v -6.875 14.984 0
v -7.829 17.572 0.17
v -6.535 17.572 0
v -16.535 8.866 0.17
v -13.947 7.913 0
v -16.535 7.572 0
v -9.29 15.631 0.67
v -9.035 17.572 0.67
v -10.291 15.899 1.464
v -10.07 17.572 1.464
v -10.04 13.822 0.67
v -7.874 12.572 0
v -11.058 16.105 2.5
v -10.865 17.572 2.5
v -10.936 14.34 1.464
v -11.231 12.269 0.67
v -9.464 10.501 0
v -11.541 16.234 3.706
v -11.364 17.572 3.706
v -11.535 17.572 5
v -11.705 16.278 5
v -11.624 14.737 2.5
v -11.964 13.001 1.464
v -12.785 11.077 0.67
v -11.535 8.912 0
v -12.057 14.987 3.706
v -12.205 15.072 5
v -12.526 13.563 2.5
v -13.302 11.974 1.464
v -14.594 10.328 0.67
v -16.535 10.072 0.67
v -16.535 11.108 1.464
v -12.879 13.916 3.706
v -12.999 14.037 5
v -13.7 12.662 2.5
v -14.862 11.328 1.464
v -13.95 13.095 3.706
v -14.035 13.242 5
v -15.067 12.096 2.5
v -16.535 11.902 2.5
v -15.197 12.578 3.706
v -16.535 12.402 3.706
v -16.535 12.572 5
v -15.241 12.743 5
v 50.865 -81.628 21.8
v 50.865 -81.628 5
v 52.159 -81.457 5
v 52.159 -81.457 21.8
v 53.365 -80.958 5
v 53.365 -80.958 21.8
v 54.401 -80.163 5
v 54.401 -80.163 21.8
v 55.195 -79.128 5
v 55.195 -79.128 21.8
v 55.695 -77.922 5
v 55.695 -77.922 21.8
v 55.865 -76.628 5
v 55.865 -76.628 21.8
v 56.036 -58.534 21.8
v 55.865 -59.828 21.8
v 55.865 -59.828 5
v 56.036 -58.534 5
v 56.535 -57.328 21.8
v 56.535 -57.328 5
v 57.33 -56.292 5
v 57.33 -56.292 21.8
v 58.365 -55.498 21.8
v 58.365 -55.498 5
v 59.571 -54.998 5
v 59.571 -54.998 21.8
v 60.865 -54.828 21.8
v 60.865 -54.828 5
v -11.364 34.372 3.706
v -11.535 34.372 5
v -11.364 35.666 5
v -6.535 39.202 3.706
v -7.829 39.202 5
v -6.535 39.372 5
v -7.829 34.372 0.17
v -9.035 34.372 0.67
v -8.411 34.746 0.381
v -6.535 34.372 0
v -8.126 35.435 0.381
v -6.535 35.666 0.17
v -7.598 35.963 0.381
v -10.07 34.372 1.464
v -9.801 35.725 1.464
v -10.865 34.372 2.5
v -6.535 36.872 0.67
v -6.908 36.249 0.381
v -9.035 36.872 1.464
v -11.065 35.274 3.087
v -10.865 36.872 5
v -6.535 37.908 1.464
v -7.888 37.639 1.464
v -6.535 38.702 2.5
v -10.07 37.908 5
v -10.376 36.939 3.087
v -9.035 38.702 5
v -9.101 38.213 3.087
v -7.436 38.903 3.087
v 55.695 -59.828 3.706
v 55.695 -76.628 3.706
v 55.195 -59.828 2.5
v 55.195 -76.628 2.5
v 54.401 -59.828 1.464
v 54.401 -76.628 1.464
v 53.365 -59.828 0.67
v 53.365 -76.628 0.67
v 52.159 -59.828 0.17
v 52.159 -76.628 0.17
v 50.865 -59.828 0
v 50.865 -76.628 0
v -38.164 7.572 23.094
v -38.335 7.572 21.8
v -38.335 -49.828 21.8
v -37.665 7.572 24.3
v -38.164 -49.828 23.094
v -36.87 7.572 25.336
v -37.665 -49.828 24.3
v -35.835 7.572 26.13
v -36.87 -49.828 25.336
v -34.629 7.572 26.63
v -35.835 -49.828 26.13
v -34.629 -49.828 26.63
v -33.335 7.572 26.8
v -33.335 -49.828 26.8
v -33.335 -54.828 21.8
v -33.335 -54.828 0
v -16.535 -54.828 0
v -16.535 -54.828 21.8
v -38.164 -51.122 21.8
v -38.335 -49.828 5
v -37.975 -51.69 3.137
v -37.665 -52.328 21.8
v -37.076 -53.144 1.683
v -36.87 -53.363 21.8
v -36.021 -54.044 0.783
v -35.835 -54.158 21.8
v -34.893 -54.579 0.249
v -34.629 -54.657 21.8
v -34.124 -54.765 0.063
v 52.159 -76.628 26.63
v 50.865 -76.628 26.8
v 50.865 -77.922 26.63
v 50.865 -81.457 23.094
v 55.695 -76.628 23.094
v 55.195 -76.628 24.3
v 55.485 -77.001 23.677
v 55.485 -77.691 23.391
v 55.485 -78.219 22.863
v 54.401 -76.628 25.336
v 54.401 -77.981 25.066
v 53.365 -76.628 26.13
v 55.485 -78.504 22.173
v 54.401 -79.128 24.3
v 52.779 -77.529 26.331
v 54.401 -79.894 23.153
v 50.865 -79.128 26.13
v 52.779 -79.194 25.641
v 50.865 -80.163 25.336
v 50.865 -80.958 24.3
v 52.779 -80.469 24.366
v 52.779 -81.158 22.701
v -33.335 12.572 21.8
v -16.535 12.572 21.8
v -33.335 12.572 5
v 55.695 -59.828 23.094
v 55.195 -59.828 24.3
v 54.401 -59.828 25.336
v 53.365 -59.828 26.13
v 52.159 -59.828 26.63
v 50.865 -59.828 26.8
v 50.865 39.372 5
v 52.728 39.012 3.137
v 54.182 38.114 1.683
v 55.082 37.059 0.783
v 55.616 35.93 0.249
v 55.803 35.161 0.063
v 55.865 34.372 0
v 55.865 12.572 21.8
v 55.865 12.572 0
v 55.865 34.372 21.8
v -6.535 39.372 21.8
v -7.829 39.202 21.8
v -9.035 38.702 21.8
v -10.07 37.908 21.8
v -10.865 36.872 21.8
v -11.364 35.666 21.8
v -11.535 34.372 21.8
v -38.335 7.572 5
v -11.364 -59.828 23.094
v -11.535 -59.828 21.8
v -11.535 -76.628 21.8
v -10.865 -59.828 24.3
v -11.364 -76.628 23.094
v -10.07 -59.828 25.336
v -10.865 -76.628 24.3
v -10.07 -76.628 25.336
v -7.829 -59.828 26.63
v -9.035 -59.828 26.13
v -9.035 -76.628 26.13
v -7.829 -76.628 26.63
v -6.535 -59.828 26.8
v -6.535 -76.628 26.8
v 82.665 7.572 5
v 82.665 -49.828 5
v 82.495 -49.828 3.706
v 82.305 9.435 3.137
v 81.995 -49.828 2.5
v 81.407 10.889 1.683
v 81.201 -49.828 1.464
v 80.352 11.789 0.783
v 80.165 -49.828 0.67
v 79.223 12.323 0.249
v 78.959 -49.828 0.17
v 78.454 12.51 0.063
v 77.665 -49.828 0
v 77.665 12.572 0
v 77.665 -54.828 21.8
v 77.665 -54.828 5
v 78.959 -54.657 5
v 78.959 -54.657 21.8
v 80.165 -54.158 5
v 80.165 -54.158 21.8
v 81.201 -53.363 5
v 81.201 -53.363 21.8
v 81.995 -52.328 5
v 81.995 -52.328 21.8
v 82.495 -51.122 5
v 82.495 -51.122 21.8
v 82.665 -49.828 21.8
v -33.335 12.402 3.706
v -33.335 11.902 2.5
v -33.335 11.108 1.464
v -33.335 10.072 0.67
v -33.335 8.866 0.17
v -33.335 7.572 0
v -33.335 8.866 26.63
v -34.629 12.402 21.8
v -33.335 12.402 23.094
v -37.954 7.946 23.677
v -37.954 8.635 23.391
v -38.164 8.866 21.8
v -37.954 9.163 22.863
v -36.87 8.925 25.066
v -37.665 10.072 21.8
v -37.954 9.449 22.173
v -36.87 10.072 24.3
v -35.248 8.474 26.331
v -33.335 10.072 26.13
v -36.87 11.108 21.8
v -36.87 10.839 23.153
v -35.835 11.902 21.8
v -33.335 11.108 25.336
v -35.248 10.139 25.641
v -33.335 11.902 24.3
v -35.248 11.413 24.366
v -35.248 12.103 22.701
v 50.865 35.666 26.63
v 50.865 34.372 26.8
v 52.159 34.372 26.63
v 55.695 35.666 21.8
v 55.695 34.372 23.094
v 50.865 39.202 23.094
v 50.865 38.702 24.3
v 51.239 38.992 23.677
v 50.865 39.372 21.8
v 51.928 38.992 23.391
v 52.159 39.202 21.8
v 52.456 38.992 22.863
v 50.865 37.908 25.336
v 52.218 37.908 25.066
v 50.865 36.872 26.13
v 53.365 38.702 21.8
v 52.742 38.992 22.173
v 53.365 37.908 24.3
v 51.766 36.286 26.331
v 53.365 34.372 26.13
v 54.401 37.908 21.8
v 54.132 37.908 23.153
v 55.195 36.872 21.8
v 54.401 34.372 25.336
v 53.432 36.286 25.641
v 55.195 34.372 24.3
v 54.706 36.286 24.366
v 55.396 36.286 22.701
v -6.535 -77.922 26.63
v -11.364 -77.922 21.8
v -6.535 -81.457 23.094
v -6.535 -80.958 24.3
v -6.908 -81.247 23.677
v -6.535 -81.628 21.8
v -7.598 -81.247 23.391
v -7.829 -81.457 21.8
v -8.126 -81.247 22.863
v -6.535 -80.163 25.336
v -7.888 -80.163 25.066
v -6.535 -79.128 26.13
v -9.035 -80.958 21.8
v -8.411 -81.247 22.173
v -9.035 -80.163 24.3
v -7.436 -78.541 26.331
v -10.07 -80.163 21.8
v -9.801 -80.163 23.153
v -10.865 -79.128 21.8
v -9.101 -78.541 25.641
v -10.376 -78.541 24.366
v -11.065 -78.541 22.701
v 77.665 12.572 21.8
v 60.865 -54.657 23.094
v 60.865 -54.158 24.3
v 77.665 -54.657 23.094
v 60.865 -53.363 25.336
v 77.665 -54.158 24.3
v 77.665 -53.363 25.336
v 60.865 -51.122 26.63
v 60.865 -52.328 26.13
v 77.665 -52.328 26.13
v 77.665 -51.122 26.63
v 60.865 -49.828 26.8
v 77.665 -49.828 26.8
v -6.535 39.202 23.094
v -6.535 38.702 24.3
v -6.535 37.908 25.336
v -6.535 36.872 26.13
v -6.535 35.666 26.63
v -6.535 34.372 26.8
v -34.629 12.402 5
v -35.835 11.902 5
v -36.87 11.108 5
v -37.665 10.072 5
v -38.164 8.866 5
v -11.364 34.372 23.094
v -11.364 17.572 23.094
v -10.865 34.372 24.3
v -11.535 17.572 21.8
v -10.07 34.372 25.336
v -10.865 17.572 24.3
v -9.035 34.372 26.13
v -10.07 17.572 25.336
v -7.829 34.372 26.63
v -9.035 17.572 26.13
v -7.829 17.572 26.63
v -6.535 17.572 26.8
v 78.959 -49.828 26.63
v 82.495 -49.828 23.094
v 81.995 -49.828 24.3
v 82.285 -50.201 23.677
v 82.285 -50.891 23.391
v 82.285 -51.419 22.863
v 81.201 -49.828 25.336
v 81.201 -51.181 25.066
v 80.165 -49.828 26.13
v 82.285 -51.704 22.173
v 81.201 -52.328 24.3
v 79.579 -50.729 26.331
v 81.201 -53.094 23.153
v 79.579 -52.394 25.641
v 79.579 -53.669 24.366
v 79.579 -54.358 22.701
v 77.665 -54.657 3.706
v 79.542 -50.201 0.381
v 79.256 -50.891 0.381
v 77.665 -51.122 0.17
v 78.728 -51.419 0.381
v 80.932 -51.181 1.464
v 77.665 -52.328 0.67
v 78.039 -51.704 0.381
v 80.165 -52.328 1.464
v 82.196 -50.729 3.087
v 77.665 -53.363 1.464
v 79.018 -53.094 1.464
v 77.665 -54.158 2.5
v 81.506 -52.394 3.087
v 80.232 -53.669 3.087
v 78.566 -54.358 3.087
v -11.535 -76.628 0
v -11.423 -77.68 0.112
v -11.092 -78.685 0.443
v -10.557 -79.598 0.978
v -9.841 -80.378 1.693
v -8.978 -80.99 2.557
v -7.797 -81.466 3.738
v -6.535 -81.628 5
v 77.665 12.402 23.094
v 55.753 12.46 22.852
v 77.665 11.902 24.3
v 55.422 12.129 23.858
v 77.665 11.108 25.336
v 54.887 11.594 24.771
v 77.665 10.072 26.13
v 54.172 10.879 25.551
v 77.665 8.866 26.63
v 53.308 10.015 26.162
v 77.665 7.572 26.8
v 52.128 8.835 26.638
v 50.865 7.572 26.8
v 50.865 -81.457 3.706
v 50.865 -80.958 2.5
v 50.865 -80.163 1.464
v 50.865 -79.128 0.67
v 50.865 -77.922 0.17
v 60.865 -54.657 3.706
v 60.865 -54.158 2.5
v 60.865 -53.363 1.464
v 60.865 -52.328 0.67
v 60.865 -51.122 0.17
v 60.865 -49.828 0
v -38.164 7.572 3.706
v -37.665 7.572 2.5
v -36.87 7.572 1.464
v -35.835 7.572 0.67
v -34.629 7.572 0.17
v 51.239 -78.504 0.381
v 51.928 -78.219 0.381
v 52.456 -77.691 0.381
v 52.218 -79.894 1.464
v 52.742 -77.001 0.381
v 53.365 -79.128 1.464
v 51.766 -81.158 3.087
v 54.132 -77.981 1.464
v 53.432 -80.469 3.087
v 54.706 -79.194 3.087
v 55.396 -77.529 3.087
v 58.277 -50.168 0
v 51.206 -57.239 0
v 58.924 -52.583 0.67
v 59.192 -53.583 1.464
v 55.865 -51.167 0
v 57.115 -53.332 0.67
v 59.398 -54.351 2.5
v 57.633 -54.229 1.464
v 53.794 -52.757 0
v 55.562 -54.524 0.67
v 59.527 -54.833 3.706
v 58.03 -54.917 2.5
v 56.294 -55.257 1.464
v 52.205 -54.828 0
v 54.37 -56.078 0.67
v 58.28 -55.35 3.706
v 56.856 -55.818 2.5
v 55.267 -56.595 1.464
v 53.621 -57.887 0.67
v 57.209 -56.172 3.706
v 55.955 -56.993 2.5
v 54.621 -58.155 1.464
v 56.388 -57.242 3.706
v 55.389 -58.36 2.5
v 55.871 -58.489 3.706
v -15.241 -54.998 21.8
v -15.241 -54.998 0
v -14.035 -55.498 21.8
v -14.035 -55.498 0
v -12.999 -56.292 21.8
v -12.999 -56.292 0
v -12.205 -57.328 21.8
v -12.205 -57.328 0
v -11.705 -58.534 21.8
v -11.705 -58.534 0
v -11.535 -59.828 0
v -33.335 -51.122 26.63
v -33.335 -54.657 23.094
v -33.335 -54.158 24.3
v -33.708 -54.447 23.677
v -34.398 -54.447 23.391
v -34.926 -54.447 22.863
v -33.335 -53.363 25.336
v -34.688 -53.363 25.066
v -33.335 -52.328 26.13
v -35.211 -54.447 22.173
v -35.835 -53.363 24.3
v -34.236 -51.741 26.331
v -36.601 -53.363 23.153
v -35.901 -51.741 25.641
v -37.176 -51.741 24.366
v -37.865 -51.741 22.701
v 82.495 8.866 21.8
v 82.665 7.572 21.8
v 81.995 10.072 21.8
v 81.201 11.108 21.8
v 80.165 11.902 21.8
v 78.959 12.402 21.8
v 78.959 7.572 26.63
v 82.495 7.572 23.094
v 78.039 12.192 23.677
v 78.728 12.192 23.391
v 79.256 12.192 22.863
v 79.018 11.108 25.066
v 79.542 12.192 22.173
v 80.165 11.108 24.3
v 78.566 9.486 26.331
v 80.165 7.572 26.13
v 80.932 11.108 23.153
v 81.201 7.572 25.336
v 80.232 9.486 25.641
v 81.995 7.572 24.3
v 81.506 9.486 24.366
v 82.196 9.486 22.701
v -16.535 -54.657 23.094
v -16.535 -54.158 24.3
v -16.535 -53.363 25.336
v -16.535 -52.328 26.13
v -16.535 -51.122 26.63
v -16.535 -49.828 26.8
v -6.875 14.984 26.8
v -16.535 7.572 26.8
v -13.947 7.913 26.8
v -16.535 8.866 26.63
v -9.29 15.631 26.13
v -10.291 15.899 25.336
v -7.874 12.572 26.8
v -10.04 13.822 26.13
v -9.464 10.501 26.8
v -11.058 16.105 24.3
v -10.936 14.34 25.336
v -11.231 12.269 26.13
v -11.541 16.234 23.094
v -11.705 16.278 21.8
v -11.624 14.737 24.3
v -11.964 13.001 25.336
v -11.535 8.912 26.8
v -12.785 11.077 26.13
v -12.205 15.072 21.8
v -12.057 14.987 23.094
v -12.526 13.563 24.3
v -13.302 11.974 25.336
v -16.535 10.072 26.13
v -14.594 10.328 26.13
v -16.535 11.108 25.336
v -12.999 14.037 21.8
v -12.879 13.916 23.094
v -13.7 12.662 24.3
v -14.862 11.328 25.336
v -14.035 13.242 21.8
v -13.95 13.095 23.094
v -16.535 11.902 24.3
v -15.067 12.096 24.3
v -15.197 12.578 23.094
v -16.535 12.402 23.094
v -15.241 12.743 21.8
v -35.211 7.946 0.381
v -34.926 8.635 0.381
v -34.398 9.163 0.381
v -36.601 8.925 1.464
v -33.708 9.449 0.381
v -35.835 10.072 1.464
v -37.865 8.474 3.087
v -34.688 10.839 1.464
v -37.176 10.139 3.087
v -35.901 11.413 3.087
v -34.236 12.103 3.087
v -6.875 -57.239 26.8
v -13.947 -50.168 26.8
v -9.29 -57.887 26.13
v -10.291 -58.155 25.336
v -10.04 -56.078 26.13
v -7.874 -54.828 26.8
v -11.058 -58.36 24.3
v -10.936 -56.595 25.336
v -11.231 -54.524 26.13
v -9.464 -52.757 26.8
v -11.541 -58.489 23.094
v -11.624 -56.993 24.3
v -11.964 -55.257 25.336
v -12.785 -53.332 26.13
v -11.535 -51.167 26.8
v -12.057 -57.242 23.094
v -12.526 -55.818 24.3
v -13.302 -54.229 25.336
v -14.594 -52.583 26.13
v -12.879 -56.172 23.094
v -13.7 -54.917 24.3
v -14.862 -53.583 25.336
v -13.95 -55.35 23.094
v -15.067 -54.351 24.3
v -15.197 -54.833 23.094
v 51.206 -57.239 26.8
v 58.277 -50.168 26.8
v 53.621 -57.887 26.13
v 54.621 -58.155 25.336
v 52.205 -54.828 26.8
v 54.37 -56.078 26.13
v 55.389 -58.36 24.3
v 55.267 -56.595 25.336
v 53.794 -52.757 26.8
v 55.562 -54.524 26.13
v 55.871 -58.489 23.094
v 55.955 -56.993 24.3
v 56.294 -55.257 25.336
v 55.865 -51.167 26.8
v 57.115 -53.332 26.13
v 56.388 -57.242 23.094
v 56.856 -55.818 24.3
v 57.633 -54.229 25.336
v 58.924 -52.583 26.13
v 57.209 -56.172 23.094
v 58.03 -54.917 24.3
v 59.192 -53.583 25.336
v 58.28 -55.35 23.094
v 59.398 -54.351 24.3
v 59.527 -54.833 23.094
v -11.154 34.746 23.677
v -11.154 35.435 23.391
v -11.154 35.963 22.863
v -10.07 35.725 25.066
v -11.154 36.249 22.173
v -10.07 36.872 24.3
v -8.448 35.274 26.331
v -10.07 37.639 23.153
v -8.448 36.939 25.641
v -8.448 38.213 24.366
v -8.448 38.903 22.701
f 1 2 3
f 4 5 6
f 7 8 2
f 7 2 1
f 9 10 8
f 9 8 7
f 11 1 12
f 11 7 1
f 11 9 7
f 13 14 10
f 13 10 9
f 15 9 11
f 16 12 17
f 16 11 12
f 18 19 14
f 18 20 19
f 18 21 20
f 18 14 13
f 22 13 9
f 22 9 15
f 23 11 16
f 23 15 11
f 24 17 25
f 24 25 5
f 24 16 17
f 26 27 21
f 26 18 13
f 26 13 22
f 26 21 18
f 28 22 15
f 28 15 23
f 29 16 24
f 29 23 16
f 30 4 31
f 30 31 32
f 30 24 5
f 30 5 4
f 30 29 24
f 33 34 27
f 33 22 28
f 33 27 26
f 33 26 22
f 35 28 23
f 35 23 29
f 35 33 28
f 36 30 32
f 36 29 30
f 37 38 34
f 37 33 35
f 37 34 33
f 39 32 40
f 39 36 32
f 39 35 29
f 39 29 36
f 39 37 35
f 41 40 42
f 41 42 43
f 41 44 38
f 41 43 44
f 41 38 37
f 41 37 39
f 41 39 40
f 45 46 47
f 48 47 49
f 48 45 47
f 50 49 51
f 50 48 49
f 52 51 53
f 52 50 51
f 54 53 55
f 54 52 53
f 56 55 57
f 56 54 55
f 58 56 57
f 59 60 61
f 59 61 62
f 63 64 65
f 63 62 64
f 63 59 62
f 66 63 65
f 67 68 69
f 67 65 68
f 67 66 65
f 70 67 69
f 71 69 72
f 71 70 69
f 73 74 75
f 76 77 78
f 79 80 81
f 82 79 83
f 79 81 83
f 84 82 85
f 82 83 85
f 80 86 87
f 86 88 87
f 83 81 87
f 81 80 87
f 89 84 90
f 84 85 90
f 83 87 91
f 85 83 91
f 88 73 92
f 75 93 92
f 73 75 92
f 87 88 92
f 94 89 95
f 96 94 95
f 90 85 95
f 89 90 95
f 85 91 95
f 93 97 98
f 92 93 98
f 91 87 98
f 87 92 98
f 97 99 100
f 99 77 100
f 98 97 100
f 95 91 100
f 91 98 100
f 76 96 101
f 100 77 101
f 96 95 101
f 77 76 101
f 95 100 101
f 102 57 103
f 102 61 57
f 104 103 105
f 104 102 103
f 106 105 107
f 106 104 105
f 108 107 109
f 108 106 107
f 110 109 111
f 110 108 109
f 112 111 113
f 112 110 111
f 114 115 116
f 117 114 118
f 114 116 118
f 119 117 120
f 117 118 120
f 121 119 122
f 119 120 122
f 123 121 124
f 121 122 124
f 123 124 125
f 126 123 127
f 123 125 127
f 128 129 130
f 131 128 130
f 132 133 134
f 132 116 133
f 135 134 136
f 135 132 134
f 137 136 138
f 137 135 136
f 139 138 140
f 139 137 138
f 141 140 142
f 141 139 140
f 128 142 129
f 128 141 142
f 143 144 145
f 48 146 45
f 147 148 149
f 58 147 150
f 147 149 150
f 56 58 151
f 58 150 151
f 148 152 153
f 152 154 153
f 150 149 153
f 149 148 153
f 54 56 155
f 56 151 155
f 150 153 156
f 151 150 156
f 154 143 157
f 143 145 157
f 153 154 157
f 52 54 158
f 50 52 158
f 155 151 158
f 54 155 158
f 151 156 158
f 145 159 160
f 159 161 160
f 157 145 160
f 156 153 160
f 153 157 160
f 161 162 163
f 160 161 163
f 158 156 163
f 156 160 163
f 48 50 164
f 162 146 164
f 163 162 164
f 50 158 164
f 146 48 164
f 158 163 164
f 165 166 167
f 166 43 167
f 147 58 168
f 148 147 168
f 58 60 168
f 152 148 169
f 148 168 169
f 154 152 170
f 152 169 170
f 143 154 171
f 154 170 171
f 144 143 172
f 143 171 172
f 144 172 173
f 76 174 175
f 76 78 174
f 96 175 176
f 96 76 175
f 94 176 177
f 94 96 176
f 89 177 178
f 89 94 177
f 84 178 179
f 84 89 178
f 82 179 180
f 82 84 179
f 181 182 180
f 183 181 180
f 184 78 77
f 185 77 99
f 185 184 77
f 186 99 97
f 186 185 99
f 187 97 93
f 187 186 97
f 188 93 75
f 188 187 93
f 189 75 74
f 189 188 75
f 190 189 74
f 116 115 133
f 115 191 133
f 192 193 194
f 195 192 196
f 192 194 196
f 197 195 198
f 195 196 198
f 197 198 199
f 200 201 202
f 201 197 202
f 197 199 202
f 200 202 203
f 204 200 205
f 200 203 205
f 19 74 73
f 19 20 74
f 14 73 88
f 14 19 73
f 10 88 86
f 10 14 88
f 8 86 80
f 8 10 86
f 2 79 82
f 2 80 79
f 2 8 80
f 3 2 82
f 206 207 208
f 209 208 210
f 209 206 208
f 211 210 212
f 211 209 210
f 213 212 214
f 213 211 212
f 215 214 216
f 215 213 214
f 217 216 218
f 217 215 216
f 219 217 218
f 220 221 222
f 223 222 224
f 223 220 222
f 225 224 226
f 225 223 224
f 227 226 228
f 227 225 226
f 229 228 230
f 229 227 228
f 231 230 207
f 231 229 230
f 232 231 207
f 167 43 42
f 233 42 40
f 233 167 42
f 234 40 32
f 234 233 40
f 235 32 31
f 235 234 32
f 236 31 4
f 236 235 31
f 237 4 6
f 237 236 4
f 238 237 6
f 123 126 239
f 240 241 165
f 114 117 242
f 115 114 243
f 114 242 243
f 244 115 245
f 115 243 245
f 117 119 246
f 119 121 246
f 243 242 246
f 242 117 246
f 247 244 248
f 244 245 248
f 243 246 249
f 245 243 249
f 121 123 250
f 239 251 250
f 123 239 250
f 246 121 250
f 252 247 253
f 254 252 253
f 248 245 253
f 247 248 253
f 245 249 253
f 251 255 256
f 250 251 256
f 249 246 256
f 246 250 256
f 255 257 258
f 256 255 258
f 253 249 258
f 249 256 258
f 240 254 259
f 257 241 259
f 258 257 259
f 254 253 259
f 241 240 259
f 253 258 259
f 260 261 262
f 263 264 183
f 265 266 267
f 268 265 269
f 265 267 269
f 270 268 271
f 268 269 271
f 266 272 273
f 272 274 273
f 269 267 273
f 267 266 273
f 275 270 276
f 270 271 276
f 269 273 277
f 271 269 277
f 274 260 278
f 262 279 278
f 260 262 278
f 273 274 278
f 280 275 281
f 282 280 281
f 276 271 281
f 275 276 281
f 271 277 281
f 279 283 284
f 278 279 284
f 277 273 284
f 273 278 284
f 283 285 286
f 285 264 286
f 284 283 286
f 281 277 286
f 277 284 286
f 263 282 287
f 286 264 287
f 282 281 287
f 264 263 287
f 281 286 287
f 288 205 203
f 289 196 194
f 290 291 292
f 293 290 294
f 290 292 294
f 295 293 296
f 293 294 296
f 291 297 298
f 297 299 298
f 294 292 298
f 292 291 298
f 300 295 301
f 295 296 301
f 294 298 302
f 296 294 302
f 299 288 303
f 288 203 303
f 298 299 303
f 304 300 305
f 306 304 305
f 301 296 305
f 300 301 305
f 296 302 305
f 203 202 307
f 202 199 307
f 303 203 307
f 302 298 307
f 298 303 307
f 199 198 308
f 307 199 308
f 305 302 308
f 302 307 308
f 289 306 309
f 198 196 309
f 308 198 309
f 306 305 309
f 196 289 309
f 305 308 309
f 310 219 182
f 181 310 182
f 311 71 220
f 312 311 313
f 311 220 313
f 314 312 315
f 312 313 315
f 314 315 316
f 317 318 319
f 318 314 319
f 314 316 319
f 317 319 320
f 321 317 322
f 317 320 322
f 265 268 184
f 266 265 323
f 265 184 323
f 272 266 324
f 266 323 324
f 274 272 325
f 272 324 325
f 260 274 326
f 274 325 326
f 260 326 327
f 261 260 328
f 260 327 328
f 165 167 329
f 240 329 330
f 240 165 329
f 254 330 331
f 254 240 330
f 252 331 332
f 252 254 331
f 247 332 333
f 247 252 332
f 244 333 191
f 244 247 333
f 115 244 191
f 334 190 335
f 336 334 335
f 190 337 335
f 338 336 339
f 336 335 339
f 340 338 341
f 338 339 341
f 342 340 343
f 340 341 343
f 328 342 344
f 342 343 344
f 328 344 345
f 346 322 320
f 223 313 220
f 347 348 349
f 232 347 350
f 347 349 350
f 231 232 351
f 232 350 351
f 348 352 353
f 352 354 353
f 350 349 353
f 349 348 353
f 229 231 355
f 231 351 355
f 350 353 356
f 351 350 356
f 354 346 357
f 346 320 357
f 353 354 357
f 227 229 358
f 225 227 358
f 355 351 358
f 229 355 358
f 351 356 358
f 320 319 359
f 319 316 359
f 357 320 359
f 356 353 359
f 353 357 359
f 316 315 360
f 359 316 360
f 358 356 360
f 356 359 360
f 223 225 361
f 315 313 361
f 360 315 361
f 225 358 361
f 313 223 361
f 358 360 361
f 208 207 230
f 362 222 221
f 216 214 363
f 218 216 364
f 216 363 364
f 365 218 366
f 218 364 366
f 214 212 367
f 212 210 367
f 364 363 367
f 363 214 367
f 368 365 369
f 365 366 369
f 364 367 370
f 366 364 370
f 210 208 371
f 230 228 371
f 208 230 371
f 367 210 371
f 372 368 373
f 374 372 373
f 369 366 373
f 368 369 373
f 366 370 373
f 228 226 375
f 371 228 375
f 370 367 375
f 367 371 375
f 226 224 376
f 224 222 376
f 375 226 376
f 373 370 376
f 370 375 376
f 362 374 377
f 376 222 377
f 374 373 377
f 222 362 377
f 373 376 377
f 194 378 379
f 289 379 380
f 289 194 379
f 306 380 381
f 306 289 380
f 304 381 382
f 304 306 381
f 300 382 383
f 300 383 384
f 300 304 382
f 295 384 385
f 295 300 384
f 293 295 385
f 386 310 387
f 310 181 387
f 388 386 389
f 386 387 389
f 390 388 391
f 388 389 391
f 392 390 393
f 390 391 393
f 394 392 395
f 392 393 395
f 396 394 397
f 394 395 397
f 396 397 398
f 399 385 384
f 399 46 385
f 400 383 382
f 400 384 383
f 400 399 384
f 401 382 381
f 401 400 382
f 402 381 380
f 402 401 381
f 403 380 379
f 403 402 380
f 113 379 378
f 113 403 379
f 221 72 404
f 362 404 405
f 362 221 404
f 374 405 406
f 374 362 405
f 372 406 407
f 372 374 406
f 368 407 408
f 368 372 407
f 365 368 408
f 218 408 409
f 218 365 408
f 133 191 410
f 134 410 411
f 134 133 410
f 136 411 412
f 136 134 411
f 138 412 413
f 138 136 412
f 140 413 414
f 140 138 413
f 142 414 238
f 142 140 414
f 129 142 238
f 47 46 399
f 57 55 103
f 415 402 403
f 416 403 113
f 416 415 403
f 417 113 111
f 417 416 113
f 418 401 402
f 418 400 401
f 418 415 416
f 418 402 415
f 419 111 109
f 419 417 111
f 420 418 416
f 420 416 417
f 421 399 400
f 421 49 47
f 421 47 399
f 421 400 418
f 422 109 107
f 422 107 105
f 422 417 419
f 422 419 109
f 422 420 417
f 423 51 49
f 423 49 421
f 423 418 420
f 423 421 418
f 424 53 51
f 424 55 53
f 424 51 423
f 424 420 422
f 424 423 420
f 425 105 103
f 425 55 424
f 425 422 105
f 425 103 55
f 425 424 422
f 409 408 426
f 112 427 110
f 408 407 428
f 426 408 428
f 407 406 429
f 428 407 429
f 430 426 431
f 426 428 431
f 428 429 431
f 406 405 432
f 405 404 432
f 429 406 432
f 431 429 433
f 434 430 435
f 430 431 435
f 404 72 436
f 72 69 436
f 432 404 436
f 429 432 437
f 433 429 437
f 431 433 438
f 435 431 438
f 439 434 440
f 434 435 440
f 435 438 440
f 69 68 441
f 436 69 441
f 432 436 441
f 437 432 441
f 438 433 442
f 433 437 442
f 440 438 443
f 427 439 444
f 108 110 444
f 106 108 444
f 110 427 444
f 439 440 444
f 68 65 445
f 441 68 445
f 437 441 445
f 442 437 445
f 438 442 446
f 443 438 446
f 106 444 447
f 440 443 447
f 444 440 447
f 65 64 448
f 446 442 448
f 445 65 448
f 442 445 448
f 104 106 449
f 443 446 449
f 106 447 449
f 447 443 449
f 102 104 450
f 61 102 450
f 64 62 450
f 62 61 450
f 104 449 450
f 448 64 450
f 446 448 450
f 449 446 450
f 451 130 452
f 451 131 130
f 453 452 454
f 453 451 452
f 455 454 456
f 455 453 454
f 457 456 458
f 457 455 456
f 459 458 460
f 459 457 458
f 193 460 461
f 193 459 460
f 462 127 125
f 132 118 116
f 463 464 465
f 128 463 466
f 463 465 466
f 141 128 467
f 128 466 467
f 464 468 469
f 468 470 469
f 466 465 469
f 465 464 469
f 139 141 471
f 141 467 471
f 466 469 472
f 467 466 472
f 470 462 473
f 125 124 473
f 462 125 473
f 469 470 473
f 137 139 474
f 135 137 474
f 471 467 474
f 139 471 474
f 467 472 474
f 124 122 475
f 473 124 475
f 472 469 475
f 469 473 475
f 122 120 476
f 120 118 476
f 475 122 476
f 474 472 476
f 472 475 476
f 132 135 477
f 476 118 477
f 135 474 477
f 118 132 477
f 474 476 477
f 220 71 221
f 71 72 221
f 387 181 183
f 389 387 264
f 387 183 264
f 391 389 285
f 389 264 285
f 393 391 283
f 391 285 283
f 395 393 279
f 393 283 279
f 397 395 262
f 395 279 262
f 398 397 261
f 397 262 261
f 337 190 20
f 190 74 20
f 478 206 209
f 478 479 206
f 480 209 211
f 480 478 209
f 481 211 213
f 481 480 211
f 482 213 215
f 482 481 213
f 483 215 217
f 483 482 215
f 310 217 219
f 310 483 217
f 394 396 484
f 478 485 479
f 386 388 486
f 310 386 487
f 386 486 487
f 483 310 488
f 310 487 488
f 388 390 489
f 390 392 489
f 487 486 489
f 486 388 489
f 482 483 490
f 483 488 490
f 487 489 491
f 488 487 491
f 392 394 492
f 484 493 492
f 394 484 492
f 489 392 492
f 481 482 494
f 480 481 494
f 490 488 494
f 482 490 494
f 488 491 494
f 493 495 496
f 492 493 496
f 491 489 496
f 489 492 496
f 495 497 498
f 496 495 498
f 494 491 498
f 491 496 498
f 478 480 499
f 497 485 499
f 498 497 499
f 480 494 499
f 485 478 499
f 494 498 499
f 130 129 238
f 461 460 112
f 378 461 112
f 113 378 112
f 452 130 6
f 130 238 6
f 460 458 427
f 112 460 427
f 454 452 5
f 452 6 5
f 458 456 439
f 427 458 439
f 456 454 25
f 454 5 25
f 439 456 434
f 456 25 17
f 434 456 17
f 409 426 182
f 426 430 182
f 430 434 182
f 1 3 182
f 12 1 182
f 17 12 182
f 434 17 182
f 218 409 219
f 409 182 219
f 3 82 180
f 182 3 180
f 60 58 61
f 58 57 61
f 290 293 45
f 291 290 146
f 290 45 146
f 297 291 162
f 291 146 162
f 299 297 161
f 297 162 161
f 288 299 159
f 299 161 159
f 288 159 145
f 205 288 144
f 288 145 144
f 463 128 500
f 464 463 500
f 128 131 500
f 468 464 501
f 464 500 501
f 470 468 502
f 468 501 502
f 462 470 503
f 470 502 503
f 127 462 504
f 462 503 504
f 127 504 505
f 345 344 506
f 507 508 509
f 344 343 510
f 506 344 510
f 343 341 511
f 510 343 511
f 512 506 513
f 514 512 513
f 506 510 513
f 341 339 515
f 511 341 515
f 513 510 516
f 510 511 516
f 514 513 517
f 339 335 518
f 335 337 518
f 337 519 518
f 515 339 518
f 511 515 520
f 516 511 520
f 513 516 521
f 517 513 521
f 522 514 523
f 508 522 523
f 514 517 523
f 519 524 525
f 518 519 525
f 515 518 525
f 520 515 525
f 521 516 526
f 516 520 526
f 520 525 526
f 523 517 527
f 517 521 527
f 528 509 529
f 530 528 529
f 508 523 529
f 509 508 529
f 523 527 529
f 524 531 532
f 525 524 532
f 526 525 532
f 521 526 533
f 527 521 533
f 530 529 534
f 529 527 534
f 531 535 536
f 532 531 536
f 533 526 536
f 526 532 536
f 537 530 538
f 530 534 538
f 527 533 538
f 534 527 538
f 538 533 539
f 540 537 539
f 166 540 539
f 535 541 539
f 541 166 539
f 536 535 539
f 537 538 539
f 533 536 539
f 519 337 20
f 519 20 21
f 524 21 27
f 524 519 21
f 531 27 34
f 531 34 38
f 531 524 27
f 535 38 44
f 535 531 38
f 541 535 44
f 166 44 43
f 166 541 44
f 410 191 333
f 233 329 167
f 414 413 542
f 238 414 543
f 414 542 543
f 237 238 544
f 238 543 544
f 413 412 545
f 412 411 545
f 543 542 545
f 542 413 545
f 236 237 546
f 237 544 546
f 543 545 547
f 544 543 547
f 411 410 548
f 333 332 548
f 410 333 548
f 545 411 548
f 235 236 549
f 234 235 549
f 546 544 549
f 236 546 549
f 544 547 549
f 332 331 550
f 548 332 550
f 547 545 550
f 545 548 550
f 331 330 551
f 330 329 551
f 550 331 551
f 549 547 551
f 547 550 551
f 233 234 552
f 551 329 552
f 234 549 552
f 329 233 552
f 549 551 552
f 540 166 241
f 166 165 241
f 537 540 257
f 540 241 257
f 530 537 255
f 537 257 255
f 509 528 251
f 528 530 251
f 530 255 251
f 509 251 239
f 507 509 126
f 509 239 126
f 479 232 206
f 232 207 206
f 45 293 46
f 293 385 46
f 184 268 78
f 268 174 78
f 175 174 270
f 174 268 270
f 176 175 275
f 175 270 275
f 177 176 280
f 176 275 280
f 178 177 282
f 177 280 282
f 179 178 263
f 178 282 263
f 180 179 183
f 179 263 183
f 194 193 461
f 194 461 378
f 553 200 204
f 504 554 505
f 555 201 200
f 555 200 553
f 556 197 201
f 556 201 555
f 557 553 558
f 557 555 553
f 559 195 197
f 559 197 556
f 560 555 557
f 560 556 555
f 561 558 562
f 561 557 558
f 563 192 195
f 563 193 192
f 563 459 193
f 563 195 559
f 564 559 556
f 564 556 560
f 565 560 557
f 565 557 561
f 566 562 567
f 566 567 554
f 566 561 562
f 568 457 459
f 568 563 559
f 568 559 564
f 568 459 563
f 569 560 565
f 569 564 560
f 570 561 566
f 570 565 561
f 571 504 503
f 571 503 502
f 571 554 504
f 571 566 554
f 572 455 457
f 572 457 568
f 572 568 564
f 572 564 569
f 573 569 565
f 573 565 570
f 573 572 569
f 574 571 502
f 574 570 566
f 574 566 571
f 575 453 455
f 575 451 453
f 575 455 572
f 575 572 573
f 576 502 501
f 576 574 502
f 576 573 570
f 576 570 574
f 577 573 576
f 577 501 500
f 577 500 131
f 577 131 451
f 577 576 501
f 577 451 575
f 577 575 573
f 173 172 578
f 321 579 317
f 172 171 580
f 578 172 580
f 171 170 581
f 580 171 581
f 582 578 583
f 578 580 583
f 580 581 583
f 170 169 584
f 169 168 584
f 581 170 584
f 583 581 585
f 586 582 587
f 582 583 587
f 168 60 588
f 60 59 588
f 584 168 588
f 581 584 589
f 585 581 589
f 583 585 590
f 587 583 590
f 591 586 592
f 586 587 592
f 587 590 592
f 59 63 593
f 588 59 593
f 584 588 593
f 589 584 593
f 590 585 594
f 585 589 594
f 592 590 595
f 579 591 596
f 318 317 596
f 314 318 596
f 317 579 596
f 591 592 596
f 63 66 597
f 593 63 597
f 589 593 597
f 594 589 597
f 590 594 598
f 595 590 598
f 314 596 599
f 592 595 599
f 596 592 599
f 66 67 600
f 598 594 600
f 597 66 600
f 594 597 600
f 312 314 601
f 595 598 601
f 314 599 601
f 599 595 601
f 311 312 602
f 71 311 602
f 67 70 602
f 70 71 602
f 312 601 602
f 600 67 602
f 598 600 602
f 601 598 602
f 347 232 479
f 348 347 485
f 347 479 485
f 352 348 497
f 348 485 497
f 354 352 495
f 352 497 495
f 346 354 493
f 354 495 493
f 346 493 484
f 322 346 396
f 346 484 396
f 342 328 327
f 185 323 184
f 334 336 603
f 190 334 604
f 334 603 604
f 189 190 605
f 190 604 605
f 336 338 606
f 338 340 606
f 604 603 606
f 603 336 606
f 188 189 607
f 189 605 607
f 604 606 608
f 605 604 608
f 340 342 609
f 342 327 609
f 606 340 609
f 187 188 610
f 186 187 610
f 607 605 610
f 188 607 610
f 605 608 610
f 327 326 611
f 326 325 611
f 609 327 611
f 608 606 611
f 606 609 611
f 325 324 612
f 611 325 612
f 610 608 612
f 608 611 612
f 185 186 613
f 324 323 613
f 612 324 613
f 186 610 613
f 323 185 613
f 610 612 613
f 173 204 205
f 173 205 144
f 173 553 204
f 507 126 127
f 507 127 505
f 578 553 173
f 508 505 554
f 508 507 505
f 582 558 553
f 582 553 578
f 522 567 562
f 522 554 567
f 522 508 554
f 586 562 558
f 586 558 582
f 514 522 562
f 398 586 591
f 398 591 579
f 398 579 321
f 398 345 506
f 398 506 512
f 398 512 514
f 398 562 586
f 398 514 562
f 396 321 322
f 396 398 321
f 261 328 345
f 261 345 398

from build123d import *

# Parameters (mm, degrees)
F1_DEPTH = 26.8
F2_R     = 5


with BuildPart() as f1:
    # F0 (on Top) → F1 (new body)
    with BuildSketch(Plane.XY):
        Polygon((55.8652869582, 39.3723181486), (-11.5347130418, 39.3723181486), (-11.5347130418, 12.5723181486), (-38.3347130418, 12.5723181486), (-38.3347130418, -54.8276818514), (-11.5347130418, -54.8276818514), (-11.5347130418, -81.6276818514), (55.8652869582, -81.6276818514), (55.8652869582, -54.8276818514), (82.6652869582, -54.8276818514), (82.6652869582, 12.5723181486), (55.8652869582, 12.5723181486), align=None)
    extrude(amount=F1_DEPTH)

    # F2
    f2_edges = [f1.edges().sort_by_distance(p)[0] for p in [
        (-11.534713, -68.227682, 26.8),
        (22.165287, -81.627682, 26.8),
        (55.865287, -68.227682, 26.8),
        (69.265287, -54.827682, 26.8),
        (82.665287, -21.127682, 26.8),
        (69.265287, 12.572318, 26.8),
        (55.865287, 25.972318, 26.8),
        (22.165287, 39.372318, 26.8),
        (-11.534713, 25.972318, 26.8),
        (-24.934713, 12.572318, 26.8),
        (-38.334713, -21.127682, 26.8),
        (-24.934713, -54.827682, 26.8),
        (55.865287, -81.627682, 13.4),
        (55.865287, -54.827682, 13.4),
        (82.665287, -54.827682, 13.4),
        (82.665287, 12.572318, 13.4),
        (82.665287, -21.127682, 0),
        (-11.534713, -81.627682, 13.4),
        (22.165287, -81.627682, 0),
        (-11.534713, -54.827682, 13.4),
        (69.265287, -54.827682, 0),
        (-38.334713, 12.572318, 13.4),
        (-38.334713, -54.827682, 13.4),
        (-38.334713, -21.127682, 0),
        (-11.534713, 39.372318, 13.4),
        (-11.534713, 12.572318, 13.4),
        (-11.534713, 25.972318, 0),
        (55.865287, 39.372318, 13.4),
        (22.165287, 39.372318, 0),
        (55.865287, -68.227682, 0),
        (-24.934713, 12.572318, 0),
    ]]
    fillet(f2_edges, radius=F2_R)


solid = f1.part
